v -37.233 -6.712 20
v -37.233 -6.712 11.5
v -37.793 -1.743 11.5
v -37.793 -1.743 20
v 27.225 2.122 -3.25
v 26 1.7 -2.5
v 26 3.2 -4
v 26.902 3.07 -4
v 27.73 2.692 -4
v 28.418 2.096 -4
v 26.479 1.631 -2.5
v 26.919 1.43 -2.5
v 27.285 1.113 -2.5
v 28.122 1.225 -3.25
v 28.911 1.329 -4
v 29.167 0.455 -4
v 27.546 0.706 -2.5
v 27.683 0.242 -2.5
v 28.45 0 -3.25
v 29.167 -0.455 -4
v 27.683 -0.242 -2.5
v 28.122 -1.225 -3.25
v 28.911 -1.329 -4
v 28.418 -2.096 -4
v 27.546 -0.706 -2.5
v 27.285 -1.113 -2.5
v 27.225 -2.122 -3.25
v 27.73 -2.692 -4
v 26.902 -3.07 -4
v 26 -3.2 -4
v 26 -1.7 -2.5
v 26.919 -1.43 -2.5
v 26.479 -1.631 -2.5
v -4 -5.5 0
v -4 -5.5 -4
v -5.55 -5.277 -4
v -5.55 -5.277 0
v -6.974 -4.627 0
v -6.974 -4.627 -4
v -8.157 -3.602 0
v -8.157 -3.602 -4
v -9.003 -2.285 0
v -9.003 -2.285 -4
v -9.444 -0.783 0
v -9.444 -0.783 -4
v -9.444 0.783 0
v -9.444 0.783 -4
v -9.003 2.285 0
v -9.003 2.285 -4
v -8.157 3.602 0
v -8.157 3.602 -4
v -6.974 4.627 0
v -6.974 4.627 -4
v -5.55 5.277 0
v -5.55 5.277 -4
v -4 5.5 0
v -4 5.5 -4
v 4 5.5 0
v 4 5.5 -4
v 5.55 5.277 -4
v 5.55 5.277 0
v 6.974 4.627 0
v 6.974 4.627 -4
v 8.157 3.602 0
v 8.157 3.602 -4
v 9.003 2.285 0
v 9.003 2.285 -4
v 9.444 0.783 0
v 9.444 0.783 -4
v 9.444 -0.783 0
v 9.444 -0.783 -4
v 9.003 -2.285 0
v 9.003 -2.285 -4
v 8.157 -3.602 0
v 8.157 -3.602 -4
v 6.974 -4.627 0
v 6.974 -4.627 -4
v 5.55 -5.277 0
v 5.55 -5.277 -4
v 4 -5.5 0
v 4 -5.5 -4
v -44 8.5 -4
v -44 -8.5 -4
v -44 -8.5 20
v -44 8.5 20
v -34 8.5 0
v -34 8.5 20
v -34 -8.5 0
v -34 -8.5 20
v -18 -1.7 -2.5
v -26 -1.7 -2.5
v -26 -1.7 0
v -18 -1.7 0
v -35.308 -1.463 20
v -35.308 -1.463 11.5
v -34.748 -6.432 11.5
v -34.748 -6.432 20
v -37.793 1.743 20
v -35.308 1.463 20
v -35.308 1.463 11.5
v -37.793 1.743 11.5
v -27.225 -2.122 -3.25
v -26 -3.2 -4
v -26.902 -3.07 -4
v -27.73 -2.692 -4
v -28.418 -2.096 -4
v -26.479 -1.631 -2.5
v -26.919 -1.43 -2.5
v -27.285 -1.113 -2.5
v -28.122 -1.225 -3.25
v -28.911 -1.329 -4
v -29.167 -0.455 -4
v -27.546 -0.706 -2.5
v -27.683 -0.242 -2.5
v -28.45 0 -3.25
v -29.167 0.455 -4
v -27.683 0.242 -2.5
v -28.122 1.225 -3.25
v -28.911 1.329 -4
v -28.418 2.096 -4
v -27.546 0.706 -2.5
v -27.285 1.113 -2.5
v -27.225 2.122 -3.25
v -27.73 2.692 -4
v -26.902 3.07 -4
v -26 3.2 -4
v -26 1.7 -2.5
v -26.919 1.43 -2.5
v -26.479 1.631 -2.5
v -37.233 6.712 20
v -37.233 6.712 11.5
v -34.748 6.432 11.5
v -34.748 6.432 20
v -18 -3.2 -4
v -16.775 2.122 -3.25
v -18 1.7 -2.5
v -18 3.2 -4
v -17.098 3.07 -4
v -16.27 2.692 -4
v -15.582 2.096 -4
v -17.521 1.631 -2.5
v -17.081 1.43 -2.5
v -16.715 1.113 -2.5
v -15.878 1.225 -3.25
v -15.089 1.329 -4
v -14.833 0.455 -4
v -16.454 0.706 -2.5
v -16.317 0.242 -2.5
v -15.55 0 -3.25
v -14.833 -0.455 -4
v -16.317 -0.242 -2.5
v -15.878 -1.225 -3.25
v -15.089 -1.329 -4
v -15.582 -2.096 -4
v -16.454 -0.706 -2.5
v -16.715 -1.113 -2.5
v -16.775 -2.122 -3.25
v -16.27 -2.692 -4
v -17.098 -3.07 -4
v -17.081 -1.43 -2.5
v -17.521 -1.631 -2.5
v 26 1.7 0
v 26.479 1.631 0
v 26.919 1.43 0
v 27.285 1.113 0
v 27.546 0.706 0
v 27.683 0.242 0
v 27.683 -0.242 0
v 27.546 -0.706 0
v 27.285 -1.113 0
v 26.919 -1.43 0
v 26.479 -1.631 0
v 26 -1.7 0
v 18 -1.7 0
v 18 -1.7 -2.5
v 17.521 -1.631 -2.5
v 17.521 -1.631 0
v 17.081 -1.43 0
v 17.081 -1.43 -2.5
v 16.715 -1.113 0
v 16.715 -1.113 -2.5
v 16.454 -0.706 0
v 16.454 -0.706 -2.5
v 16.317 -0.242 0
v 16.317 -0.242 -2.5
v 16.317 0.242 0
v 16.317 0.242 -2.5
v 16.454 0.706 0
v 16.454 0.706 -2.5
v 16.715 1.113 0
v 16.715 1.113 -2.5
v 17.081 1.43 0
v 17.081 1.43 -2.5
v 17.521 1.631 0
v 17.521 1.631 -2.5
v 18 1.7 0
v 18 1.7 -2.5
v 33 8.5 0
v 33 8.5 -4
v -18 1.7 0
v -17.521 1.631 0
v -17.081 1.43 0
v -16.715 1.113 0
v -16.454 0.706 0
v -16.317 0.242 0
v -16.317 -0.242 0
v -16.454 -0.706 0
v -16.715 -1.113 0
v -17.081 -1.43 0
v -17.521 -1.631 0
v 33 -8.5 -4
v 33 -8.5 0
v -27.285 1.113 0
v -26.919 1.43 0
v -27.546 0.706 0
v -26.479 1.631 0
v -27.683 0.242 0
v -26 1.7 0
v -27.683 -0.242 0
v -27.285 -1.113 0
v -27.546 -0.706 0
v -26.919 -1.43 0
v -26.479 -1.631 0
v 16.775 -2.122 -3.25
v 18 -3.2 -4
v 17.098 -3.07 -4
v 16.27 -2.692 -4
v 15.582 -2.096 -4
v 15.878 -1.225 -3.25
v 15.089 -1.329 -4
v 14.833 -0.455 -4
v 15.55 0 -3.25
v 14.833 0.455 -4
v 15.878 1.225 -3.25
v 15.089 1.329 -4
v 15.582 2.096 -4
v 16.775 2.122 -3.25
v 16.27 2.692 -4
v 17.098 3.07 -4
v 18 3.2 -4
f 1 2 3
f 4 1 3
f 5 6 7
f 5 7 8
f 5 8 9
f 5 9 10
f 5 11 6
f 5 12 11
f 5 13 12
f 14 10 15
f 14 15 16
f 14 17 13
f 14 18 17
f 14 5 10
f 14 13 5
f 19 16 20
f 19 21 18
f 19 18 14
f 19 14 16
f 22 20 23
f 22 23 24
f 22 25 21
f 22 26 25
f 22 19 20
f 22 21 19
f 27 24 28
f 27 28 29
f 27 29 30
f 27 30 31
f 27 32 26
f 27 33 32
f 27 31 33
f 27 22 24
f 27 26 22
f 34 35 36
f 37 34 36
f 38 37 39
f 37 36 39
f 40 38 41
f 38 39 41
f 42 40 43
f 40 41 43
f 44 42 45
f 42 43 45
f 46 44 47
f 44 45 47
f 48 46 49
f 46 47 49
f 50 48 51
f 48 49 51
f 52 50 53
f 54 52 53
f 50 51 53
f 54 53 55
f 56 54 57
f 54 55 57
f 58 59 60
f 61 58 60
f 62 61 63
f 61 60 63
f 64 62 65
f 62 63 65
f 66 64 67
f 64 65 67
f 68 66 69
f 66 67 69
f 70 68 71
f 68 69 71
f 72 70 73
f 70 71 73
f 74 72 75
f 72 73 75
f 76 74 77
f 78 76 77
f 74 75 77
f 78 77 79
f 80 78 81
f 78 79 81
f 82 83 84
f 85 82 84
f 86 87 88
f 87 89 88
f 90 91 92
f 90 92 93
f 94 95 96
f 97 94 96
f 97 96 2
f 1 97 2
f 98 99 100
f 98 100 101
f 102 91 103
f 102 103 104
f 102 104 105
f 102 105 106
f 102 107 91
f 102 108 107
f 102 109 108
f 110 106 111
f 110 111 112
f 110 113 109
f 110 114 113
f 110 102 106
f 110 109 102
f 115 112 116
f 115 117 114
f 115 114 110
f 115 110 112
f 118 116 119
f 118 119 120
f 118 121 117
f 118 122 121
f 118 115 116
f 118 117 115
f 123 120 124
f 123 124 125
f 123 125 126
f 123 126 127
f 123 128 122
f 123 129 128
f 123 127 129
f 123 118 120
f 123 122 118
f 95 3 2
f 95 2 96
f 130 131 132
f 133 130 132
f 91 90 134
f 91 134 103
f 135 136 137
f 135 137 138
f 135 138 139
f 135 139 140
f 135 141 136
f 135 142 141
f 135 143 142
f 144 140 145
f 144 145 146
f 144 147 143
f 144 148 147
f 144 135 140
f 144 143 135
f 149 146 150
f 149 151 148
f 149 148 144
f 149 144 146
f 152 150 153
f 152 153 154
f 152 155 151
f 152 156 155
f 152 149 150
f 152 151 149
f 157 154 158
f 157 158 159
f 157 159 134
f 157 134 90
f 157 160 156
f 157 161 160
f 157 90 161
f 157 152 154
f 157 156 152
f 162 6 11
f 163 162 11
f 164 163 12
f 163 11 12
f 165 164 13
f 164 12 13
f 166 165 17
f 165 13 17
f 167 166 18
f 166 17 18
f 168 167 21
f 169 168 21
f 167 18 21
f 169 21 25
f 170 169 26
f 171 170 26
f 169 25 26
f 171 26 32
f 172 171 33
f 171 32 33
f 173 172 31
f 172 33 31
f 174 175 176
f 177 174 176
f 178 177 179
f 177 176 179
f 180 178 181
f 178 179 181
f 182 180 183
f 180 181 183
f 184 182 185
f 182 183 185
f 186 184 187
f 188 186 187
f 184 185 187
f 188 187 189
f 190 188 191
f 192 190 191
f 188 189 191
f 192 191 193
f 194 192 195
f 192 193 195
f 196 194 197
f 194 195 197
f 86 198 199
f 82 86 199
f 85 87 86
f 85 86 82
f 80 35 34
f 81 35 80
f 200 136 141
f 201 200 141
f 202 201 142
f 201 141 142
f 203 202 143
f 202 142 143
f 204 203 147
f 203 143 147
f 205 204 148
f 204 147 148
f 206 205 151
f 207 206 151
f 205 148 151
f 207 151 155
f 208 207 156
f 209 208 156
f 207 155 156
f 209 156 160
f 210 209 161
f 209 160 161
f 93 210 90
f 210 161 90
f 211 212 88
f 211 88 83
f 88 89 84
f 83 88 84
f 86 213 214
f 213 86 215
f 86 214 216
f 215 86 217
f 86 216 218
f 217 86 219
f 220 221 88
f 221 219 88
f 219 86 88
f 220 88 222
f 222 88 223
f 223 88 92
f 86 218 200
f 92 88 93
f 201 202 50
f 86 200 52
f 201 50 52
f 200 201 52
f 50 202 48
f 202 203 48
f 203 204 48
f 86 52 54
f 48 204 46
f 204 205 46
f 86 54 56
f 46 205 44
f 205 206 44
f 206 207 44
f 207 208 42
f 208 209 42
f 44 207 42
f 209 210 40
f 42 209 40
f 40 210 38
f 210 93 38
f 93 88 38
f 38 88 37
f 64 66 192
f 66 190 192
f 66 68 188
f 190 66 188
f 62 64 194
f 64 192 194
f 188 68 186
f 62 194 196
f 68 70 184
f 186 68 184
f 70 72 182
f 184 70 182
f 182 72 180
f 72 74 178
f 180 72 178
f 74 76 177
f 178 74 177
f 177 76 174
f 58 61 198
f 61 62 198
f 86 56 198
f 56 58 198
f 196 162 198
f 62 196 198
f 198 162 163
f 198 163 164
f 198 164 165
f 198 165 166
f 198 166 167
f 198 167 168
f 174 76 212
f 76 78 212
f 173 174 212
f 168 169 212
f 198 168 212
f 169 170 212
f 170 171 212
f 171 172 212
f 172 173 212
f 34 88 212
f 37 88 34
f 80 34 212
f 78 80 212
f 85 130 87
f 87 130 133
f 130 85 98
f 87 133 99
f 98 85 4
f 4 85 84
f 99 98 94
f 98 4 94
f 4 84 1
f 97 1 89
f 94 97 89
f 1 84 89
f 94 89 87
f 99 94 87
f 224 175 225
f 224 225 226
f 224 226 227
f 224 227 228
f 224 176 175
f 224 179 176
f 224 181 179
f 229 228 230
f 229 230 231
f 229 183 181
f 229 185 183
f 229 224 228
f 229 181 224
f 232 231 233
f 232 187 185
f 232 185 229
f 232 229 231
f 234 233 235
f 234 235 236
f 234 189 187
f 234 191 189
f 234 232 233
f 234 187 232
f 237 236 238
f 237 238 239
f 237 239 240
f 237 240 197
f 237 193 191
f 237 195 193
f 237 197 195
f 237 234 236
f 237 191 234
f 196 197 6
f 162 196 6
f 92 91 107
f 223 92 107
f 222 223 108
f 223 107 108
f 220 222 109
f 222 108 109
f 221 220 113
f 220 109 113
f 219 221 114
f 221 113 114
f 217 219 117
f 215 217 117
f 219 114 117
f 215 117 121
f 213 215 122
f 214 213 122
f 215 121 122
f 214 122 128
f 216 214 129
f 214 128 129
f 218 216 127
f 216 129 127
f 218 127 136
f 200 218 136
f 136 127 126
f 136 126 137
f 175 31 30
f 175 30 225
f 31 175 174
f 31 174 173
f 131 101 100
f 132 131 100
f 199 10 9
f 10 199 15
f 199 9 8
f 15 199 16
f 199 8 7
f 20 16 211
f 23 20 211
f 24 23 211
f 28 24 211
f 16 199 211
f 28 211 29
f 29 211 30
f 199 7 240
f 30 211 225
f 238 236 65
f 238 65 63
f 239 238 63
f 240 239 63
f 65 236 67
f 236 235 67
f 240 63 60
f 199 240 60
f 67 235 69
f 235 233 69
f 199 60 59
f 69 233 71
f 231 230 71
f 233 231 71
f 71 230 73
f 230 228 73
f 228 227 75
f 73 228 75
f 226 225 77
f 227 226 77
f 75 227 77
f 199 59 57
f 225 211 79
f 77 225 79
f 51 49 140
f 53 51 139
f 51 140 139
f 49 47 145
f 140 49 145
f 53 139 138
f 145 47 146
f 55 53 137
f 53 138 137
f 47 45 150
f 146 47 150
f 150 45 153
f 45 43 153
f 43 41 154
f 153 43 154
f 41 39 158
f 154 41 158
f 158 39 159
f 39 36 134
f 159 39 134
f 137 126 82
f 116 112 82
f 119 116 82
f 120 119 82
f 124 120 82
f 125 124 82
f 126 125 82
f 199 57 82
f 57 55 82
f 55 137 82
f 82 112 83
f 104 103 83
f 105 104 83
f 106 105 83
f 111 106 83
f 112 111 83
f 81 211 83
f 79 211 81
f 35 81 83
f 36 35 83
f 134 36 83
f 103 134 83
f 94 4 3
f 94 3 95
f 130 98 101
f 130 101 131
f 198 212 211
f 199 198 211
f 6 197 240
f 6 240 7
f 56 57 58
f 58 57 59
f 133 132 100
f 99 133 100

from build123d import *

# Parameters (mm, degrees)
PAD_DEPTH       = 8.5
POCKET_DEPTH    = 24.001
POCKET001_DEPTH = 8.5
CHAMFER_SIZE    = 1.5
CHAMFER001_SIZE = 1.5


with BuildPart() as part:
    # Sketch → Pad (new body, symmetric)
    with BuildSketch(Plane.XZ):
        Polygon((-44, -4), (-44, 20), (-34, 20), (-34, 0), (33, 0), (33, -4), align=None)
    extrude(amount=PAD_DEPTH, both=True)

    # Sketch001 → Pocket (cut, through all)
    with BuildSketch(Plane(origin=(0, 0, -4), x_dir=(1, 0, 0), z_dir=(0, 0, -1))):
        with BuildLine():
            ThreePointArc((-26, 1.7), (-27.7, 0), (-26, -1.7))
            Line((-26, -1.7), (-18, -1.7))
            ThreePointArc((-18, -1.7), (-16.3, 0), (-18, 1.7))
            Line((-26, 1.7), (-18, 1.7))
        make_face()
        with BuildLine():
            ThreePointArc((-4, 5.5), (-9.5, 0), (-4, -5.5))
            Line((-4, -5.5), (4, -5.5))
            ThreePointArc((4, -5.5), (9.5, 0), (4, 5.5))
            Line((-4, 5.5), (4, 5.5))
        make_face()
        with BuildLine():
            ThreePointArc((18, 1.7), (16.3, 0), (18, -1.7))
            Line((18, -1.7), (26, -1.7))
            ThreePointArc((26, -1.7), (27.7, 0), (26, 1.7))
            Line((18, 1.7), (26, 1.7))
        make_face()
    extrude(amount=-POCKET_DEPTH, mode=Mode.SUBTRACT)

    # Sketch006 → Pocket001 (cut)
    with BuildSketch(Plane(origin=(0, 0, 20), x_dir=(-1, 0, 0), z_dir=(0, 0, 1))):
        Polygon((34.748284, 6.431895), (37.232557, 6.711868), (37.792504, 1.743321), (35.30823, 1.463348), align=None)
        Polygon((35.30823, -1.463348), (37.792504, -1.743321), (37.232557, -6.711868), (34.748284, -6.431895), align=None)
    extrude(amount=-POCKET001_DEPTH, mode=Mode.SUBTRACT)

    # Chamfer
    chamfer_edges = [part.edges().sort_by_distance(p)[0] for p in [
        (22, 1.7, -4),
    ]]
    chamfer(chamfer_edges, length=CHAMFER_SIZE)

    # Chamfer001
    chamfer001_edges = [part.edges().sort_by_distance(p)[0] for p in [
        (-22, 1.7, -4),
    ]]
    chamfer(chamfer001_edges, length=CHAMFER001_SIZE)


solid = part.part
